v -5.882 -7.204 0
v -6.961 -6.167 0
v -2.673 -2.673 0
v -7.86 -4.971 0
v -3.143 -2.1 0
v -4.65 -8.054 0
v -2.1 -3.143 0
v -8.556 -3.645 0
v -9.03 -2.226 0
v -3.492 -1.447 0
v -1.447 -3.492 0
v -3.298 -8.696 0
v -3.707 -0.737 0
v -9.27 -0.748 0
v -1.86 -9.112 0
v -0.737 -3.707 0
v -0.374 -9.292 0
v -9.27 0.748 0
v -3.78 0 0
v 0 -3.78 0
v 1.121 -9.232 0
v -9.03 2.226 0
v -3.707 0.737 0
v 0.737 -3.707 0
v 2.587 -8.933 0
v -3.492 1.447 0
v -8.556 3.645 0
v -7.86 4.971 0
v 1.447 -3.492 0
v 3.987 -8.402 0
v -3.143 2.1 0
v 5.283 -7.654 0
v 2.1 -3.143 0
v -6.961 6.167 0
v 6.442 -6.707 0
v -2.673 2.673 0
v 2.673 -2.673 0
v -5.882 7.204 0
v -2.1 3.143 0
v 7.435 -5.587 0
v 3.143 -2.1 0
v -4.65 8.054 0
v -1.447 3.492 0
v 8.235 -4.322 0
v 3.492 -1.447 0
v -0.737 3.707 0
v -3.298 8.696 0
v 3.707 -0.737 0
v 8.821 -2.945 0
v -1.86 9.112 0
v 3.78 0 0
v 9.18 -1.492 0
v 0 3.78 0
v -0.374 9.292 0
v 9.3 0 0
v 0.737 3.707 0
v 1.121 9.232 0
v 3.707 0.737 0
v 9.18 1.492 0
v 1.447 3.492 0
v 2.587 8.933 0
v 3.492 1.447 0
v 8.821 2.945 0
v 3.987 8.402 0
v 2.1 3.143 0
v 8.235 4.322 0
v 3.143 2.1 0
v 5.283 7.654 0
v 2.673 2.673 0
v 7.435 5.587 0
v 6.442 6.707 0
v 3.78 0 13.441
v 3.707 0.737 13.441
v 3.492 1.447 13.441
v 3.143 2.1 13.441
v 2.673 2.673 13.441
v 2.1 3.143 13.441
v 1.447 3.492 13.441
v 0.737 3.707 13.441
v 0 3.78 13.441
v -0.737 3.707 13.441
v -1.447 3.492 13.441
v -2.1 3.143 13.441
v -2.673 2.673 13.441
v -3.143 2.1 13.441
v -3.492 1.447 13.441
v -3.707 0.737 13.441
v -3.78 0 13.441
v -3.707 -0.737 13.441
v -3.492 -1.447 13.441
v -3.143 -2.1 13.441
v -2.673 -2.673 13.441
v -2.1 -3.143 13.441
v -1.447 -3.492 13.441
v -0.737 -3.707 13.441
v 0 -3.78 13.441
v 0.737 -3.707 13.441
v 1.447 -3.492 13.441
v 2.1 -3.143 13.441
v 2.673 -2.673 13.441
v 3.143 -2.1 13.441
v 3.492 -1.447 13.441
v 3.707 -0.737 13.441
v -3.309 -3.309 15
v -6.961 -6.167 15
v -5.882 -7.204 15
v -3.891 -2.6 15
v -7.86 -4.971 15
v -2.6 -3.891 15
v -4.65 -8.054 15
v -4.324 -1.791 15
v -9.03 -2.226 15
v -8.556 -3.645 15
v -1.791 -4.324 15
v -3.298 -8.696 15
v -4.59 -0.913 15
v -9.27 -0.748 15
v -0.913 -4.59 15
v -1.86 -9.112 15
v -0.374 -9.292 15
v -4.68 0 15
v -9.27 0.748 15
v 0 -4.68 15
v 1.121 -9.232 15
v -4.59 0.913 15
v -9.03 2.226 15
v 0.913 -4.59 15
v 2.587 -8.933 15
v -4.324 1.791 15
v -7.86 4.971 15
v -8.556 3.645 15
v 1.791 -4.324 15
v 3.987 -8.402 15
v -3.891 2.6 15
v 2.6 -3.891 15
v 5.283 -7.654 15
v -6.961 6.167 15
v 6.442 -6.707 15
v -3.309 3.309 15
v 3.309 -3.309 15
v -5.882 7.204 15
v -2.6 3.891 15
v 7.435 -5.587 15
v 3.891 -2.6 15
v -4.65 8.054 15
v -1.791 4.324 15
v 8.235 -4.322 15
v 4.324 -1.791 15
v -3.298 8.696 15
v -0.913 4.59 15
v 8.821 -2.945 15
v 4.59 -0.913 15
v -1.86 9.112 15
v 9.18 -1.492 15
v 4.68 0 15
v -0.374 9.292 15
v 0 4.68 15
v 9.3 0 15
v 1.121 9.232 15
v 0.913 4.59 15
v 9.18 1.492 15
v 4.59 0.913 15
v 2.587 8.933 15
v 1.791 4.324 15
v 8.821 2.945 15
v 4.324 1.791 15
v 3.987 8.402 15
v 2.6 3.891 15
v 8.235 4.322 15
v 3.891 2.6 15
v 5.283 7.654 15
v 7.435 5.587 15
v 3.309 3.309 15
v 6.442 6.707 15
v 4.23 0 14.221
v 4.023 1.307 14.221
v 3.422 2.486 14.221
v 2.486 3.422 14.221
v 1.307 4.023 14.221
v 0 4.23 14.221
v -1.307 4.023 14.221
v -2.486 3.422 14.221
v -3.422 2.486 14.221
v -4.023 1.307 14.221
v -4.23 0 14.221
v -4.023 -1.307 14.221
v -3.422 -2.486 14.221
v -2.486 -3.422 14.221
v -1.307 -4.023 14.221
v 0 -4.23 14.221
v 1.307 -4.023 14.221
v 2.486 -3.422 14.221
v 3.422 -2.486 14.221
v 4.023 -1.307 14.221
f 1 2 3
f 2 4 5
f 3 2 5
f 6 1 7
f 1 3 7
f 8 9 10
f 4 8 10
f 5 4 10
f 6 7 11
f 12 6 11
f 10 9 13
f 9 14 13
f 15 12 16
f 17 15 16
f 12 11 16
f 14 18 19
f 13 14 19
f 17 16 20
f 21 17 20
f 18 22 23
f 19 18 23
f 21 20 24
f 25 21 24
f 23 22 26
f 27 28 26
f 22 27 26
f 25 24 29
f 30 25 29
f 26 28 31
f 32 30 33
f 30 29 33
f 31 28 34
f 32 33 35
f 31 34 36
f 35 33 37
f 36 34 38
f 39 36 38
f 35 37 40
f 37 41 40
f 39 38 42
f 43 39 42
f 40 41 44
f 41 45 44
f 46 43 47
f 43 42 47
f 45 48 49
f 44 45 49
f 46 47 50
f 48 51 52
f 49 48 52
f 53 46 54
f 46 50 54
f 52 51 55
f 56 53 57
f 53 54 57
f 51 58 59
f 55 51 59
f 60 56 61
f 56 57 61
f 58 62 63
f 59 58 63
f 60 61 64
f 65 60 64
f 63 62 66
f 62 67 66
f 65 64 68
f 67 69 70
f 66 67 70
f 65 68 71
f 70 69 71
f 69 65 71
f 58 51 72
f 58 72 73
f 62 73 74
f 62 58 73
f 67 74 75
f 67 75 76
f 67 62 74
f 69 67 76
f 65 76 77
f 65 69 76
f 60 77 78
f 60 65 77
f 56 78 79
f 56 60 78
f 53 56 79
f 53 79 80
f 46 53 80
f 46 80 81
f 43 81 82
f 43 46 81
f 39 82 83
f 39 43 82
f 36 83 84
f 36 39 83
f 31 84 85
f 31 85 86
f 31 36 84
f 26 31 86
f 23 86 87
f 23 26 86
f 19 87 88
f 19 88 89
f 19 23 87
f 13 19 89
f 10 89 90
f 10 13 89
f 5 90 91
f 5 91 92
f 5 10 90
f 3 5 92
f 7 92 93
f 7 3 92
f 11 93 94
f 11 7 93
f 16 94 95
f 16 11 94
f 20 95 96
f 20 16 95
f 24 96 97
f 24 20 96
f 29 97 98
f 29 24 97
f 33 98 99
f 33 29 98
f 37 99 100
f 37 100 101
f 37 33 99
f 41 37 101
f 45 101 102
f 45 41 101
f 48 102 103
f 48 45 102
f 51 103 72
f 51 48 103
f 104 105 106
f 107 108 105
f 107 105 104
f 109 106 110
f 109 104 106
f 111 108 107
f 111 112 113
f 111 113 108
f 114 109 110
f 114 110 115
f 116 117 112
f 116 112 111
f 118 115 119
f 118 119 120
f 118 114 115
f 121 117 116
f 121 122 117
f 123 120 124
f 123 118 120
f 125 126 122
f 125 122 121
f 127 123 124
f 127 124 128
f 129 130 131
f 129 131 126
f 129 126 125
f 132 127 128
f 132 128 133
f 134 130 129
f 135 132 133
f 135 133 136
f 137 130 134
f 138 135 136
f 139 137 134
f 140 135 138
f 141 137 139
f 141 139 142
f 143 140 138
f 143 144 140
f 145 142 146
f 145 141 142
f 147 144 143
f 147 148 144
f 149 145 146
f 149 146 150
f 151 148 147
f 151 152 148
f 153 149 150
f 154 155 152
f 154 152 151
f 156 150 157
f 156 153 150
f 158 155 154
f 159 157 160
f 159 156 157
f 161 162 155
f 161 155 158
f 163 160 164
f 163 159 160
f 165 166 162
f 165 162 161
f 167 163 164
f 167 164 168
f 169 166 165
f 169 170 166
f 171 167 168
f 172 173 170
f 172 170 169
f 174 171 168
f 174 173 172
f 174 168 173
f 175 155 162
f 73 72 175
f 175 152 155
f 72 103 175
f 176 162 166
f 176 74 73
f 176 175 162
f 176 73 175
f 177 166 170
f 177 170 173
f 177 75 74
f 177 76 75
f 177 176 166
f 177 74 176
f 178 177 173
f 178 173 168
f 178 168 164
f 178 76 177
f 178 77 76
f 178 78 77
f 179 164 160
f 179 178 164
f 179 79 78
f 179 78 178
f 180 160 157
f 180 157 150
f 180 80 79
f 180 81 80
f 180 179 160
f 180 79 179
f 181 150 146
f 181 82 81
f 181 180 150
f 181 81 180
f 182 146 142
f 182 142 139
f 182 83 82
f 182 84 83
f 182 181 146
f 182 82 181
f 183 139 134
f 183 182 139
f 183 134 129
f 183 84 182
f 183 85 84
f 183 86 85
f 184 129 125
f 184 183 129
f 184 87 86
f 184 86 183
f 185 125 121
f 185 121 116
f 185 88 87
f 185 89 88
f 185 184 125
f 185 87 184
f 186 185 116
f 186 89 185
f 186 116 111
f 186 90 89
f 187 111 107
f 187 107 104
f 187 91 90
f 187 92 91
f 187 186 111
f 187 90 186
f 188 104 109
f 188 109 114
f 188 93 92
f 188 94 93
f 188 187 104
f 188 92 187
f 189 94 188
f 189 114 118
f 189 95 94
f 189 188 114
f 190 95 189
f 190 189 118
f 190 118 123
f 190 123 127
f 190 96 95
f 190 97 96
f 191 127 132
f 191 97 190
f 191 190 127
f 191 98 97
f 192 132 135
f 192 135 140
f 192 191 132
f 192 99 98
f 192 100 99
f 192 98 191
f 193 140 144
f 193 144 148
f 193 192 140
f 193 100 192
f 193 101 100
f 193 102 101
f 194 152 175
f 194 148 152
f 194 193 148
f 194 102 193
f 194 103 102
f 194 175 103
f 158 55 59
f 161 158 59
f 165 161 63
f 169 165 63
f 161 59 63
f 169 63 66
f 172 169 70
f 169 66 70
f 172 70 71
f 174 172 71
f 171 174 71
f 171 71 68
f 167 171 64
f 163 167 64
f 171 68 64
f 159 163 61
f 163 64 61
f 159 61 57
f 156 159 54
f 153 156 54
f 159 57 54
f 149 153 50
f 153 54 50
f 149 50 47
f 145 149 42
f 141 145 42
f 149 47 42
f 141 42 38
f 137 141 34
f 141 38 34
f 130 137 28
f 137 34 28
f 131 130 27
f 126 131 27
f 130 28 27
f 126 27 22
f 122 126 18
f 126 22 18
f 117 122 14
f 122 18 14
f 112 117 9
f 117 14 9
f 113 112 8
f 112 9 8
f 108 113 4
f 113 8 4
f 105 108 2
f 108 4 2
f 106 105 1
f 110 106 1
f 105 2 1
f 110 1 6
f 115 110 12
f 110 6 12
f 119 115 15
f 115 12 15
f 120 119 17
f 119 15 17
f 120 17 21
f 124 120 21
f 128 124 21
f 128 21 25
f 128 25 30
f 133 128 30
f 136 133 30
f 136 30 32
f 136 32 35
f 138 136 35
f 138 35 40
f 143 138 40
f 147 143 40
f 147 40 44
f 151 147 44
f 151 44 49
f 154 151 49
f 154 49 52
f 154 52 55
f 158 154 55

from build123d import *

# Parameters (mm, degrees)
F0_R     = 3.1
F0_R_2   = 1.26
F1_DEPTH = 5
F2_SIZE2 = 0.5196152423
F2_SIZE  = 0.3
F3_SCALE = 3


with BuildPart() as f1:
    # F0 (on Top) → F1 (new body)
    with BuildSketch(Plane.XY):
        Circle(F0_R)
        Circle(F0_R_2, mode=Mode.SUBTRACT)
    extrude(amount=F1_DEPTH)

    # F2
    f2_edges = [f1.edges().sort_by_distance(p)[0] for p in [
        (-1.26, 0, 5),
    ]]
    f2_side = f1.faces().sort_by_distance((-3.012319, 0, 5))[0]
    chamfer(f2_edges, length=F2_SIZE, length2=F2_SIZE2, reference=f2_side)


with BuildPart() as f1_1:
    # F3: moved
    add(f1.part.scale(F3_SCALE))


solid = f1_1.part
